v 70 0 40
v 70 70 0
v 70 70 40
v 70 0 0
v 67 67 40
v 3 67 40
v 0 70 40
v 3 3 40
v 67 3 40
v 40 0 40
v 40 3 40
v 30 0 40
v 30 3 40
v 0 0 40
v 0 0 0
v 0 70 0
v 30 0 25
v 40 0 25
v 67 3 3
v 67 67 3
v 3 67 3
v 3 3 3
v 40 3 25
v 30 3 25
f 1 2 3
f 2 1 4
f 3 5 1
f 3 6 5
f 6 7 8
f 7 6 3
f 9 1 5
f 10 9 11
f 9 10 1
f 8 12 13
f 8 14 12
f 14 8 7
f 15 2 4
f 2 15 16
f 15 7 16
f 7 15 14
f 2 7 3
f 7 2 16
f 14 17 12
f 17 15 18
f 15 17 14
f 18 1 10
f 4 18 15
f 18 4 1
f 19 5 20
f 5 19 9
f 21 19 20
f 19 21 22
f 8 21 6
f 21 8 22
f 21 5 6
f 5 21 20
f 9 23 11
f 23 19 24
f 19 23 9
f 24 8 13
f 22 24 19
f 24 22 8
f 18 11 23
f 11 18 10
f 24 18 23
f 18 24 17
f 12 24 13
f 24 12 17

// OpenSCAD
$fn = 32;

// ----------------------------------------------------------------------
// Enclosure box: notch enclosure
// ----------------------------------------------------------------------

// --- parameters (mm) ---
box_l = 70;               // outer length, X
box_w = 70;               // outer width, Y
box_h = 40;               // outer height
wall_t = 3;               // wall thickness
notch_w = 10;             // cable notch width
notch_h = 15;             // cable notch height
fit_tol = 0.1;            // tolerance for press fits, mm
free_tol = 0.3;           // tolerance for clearance fits, mm

inner_h = box_h - wall_t;  // cavity depth
boss_h = inner_h - 2;  // corner boss height

difference() {
  cube([box_l, box_w, box_h]);
  translate([wall_t, wall_t, wall_t])
    cube([box_l - 2 * wall_t, box_w - 2 * wall_t, box_h]);
  translate([box_l / 2 - notch_w / 2, -1, box_h - notch_h])
    cube([notch_w, wall_t + 2, notch_h + 1]);
}
